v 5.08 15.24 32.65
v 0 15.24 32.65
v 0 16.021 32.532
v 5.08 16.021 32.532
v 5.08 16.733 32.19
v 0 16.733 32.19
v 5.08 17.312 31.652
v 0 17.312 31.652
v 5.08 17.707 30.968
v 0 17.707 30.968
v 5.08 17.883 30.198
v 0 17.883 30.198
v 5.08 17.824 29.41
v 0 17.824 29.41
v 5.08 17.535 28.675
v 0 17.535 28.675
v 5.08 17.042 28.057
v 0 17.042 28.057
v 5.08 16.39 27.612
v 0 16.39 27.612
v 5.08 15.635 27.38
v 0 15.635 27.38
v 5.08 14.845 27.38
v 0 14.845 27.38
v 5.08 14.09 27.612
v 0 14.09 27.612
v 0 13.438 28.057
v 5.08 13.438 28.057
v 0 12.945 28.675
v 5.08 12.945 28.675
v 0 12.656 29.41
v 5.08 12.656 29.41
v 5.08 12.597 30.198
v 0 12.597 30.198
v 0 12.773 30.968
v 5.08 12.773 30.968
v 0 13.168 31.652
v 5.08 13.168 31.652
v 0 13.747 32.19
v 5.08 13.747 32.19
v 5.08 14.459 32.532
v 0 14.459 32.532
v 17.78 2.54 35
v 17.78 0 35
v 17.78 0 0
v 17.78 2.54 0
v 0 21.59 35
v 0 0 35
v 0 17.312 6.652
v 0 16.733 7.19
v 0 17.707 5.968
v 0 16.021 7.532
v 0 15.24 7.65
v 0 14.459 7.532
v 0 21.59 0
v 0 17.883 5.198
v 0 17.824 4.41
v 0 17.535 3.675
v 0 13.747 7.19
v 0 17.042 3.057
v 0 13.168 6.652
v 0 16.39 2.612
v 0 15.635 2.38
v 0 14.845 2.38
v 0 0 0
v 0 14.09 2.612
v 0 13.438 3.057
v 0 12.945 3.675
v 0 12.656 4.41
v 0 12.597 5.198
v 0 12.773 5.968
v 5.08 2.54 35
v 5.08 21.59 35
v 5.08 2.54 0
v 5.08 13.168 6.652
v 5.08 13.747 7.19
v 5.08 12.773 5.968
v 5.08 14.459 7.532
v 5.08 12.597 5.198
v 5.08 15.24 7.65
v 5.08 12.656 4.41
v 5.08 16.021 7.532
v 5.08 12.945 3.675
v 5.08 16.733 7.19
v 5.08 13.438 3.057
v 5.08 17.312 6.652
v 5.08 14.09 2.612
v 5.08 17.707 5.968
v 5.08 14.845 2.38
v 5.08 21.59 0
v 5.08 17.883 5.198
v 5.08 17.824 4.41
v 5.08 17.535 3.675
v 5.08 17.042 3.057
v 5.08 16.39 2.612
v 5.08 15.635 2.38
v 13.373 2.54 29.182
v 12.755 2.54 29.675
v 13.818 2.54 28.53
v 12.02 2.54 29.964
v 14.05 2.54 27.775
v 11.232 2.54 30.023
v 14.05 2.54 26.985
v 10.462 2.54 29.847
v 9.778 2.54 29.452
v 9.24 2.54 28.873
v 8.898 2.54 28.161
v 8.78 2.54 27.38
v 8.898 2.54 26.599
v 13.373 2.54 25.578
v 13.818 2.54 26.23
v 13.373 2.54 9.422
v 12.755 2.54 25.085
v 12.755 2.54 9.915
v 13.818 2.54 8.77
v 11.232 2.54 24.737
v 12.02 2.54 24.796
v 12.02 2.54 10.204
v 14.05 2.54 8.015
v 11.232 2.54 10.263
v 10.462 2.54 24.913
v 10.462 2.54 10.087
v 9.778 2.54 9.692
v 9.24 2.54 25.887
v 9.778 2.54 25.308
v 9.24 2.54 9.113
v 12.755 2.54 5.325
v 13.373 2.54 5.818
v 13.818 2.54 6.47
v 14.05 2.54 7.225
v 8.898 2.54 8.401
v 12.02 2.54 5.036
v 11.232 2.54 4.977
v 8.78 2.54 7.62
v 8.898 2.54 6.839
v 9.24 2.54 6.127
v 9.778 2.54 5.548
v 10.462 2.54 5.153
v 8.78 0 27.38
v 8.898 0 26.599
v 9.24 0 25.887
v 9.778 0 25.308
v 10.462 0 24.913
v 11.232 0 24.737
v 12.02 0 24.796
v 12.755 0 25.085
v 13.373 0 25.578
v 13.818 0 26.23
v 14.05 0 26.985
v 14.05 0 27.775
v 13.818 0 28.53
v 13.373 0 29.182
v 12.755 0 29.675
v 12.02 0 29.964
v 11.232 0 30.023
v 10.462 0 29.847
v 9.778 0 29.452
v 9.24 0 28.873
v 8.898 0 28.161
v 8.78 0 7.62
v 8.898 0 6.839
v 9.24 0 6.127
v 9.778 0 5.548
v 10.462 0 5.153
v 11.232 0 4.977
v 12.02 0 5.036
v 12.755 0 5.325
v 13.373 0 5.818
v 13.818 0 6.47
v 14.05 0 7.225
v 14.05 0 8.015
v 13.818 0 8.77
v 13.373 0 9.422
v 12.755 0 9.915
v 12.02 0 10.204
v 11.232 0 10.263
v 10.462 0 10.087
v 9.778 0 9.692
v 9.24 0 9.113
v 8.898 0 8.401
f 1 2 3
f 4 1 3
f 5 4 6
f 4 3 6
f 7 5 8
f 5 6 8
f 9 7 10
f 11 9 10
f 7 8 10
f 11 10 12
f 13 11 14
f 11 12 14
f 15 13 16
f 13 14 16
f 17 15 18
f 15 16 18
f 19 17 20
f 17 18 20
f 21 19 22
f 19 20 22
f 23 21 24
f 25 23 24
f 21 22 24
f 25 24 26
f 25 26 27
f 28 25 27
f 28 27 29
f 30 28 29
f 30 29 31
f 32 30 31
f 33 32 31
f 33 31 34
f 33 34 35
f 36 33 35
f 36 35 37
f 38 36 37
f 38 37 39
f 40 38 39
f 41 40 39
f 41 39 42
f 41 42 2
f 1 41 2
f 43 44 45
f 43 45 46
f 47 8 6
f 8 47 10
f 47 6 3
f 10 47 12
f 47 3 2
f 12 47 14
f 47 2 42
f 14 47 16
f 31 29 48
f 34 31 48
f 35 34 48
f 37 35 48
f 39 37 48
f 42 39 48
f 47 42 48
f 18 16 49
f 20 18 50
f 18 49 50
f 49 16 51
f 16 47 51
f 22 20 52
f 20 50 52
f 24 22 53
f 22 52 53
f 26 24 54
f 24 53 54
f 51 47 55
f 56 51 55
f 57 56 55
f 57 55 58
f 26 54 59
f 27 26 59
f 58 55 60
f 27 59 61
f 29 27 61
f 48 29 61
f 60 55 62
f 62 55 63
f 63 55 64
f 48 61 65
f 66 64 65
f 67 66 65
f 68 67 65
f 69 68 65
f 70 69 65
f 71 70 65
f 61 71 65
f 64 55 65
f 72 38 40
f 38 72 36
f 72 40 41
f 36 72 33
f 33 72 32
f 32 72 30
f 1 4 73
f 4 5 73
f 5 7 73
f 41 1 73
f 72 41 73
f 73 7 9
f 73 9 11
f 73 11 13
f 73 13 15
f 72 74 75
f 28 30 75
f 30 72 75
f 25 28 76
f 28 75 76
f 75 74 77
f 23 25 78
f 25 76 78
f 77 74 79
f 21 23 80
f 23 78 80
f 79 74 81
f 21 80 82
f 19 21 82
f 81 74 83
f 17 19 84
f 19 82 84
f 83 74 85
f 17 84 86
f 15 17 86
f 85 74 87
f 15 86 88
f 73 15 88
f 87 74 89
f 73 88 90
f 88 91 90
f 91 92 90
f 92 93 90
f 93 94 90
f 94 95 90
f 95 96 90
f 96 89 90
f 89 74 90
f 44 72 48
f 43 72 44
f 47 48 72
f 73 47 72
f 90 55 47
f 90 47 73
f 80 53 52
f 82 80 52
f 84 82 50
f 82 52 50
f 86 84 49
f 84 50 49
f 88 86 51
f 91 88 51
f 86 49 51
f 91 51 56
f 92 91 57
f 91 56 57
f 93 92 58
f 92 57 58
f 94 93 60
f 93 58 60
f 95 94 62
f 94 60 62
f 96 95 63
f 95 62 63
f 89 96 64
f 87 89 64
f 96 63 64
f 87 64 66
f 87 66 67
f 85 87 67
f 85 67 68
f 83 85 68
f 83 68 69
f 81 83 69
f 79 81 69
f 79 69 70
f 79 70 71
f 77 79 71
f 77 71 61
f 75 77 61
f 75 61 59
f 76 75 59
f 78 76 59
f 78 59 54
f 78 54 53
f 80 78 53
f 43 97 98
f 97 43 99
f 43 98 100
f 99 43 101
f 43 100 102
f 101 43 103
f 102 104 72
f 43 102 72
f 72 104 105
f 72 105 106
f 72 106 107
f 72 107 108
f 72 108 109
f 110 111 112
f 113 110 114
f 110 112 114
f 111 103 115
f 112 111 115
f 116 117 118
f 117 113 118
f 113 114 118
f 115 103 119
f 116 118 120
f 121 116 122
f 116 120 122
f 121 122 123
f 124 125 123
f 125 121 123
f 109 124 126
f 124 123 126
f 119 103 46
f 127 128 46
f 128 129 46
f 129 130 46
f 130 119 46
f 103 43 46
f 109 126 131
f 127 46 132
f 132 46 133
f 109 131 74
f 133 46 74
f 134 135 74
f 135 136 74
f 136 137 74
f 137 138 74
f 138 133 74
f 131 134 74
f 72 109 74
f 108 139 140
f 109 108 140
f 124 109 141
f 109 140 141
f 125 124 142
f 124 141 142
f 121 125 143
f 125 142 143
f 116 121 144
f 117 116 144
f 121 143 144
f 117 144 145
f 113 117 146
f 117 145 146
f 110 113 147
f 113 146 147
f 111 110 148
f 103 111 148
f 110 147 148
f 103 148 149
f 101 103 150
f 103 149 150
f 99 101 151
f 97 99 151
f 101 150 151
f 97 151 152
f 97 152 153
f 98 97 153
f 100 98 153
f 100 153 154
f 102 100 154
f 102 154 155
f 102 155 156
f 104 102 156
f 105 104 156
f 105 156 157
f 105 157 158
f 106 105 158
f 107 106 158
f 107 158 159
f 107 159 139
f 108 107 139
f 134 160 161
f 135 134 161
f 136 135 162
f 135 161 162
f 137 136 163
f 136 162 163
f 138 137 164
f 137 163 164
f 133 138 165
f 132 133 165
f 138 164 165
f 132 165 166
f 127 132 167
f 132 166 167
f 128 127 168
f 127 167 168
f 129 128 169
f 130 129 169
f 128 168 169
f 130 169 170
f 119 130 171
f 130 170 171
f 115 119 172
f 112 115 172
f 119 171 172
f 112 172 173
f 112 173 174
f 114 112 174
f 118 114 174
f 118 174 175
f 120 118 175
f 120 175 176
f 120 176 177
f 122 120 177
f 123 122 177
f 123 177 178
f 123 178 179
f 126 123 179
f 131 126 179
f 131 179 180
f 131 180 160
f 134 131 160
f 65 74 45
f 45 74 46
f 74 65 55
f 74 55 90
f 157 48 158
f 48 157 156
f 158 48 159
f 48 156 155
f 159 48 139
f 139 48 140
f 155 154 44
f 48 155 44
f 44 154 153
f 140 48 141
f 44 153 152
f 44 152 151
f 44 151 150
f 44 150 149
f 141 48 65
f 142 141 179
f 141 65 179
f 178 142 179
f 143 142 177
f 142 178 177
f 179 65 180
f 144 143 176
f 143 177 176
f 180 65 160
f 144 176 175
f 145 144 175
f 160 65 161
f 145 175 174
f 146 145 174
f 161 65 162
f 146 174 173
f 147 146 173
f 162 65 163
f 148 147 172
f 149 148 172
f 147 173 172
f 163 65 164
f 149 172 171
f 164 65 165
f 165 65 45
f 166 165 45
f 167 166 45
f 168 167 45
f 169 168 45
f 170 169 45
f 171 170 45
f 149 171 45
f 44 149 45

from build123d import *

# Parameters (mm, degrees)
SKETCH1_W             = 5.08
SKETCH1_H             = 19.05
BOSS_EXTRUDE1_DEPTH   = 35
F_5_0MM_DOWEL_HOLE1_D = 5.3
F_5_0MM_DOWEL_HOLE2_D = 5.3


with BuildPart() as part:
    # Sketch1 → Boss-Extrude1 (new body)
    with BuildSketch(Plane.XY):
        Polygon((0, 2.54), (0, 0), (17.78, 0), (17.78, 2.54), (5.08, 2.54), align=None)
        with Locations((2.54, 12.065)):
            Rectangle(SKETCH1_W, SKETCH1_H)
    extrude(amount=BOSS_EXTRUDE1_DEPTH)

    # Ø5.0mm Dowel Hole1 (through all)
    with Locations(Plane(origin=(5.08, 0, 0), x_dir=(0, 0, -1), z_dir=(1, 0, 0))):
        with Locations((-30, 15.24), (-5, 15.24)):
            Hole(F_5_0MM_DOWEL_HOLE1_D / 2)

    # Ø5.0mm Dowel Hole2 (through all)
    with Locations(Plane(origin=(0, 2.54, 0), x_dir=(1, 0, 0), z_dir=(0, 1, 0))):
        with Locations((11.43, -27.38), (11.43, -7.62)):
            Hole(F_5_0MM_DOWEL_HOLE2_D / 2)


solid = part.part
